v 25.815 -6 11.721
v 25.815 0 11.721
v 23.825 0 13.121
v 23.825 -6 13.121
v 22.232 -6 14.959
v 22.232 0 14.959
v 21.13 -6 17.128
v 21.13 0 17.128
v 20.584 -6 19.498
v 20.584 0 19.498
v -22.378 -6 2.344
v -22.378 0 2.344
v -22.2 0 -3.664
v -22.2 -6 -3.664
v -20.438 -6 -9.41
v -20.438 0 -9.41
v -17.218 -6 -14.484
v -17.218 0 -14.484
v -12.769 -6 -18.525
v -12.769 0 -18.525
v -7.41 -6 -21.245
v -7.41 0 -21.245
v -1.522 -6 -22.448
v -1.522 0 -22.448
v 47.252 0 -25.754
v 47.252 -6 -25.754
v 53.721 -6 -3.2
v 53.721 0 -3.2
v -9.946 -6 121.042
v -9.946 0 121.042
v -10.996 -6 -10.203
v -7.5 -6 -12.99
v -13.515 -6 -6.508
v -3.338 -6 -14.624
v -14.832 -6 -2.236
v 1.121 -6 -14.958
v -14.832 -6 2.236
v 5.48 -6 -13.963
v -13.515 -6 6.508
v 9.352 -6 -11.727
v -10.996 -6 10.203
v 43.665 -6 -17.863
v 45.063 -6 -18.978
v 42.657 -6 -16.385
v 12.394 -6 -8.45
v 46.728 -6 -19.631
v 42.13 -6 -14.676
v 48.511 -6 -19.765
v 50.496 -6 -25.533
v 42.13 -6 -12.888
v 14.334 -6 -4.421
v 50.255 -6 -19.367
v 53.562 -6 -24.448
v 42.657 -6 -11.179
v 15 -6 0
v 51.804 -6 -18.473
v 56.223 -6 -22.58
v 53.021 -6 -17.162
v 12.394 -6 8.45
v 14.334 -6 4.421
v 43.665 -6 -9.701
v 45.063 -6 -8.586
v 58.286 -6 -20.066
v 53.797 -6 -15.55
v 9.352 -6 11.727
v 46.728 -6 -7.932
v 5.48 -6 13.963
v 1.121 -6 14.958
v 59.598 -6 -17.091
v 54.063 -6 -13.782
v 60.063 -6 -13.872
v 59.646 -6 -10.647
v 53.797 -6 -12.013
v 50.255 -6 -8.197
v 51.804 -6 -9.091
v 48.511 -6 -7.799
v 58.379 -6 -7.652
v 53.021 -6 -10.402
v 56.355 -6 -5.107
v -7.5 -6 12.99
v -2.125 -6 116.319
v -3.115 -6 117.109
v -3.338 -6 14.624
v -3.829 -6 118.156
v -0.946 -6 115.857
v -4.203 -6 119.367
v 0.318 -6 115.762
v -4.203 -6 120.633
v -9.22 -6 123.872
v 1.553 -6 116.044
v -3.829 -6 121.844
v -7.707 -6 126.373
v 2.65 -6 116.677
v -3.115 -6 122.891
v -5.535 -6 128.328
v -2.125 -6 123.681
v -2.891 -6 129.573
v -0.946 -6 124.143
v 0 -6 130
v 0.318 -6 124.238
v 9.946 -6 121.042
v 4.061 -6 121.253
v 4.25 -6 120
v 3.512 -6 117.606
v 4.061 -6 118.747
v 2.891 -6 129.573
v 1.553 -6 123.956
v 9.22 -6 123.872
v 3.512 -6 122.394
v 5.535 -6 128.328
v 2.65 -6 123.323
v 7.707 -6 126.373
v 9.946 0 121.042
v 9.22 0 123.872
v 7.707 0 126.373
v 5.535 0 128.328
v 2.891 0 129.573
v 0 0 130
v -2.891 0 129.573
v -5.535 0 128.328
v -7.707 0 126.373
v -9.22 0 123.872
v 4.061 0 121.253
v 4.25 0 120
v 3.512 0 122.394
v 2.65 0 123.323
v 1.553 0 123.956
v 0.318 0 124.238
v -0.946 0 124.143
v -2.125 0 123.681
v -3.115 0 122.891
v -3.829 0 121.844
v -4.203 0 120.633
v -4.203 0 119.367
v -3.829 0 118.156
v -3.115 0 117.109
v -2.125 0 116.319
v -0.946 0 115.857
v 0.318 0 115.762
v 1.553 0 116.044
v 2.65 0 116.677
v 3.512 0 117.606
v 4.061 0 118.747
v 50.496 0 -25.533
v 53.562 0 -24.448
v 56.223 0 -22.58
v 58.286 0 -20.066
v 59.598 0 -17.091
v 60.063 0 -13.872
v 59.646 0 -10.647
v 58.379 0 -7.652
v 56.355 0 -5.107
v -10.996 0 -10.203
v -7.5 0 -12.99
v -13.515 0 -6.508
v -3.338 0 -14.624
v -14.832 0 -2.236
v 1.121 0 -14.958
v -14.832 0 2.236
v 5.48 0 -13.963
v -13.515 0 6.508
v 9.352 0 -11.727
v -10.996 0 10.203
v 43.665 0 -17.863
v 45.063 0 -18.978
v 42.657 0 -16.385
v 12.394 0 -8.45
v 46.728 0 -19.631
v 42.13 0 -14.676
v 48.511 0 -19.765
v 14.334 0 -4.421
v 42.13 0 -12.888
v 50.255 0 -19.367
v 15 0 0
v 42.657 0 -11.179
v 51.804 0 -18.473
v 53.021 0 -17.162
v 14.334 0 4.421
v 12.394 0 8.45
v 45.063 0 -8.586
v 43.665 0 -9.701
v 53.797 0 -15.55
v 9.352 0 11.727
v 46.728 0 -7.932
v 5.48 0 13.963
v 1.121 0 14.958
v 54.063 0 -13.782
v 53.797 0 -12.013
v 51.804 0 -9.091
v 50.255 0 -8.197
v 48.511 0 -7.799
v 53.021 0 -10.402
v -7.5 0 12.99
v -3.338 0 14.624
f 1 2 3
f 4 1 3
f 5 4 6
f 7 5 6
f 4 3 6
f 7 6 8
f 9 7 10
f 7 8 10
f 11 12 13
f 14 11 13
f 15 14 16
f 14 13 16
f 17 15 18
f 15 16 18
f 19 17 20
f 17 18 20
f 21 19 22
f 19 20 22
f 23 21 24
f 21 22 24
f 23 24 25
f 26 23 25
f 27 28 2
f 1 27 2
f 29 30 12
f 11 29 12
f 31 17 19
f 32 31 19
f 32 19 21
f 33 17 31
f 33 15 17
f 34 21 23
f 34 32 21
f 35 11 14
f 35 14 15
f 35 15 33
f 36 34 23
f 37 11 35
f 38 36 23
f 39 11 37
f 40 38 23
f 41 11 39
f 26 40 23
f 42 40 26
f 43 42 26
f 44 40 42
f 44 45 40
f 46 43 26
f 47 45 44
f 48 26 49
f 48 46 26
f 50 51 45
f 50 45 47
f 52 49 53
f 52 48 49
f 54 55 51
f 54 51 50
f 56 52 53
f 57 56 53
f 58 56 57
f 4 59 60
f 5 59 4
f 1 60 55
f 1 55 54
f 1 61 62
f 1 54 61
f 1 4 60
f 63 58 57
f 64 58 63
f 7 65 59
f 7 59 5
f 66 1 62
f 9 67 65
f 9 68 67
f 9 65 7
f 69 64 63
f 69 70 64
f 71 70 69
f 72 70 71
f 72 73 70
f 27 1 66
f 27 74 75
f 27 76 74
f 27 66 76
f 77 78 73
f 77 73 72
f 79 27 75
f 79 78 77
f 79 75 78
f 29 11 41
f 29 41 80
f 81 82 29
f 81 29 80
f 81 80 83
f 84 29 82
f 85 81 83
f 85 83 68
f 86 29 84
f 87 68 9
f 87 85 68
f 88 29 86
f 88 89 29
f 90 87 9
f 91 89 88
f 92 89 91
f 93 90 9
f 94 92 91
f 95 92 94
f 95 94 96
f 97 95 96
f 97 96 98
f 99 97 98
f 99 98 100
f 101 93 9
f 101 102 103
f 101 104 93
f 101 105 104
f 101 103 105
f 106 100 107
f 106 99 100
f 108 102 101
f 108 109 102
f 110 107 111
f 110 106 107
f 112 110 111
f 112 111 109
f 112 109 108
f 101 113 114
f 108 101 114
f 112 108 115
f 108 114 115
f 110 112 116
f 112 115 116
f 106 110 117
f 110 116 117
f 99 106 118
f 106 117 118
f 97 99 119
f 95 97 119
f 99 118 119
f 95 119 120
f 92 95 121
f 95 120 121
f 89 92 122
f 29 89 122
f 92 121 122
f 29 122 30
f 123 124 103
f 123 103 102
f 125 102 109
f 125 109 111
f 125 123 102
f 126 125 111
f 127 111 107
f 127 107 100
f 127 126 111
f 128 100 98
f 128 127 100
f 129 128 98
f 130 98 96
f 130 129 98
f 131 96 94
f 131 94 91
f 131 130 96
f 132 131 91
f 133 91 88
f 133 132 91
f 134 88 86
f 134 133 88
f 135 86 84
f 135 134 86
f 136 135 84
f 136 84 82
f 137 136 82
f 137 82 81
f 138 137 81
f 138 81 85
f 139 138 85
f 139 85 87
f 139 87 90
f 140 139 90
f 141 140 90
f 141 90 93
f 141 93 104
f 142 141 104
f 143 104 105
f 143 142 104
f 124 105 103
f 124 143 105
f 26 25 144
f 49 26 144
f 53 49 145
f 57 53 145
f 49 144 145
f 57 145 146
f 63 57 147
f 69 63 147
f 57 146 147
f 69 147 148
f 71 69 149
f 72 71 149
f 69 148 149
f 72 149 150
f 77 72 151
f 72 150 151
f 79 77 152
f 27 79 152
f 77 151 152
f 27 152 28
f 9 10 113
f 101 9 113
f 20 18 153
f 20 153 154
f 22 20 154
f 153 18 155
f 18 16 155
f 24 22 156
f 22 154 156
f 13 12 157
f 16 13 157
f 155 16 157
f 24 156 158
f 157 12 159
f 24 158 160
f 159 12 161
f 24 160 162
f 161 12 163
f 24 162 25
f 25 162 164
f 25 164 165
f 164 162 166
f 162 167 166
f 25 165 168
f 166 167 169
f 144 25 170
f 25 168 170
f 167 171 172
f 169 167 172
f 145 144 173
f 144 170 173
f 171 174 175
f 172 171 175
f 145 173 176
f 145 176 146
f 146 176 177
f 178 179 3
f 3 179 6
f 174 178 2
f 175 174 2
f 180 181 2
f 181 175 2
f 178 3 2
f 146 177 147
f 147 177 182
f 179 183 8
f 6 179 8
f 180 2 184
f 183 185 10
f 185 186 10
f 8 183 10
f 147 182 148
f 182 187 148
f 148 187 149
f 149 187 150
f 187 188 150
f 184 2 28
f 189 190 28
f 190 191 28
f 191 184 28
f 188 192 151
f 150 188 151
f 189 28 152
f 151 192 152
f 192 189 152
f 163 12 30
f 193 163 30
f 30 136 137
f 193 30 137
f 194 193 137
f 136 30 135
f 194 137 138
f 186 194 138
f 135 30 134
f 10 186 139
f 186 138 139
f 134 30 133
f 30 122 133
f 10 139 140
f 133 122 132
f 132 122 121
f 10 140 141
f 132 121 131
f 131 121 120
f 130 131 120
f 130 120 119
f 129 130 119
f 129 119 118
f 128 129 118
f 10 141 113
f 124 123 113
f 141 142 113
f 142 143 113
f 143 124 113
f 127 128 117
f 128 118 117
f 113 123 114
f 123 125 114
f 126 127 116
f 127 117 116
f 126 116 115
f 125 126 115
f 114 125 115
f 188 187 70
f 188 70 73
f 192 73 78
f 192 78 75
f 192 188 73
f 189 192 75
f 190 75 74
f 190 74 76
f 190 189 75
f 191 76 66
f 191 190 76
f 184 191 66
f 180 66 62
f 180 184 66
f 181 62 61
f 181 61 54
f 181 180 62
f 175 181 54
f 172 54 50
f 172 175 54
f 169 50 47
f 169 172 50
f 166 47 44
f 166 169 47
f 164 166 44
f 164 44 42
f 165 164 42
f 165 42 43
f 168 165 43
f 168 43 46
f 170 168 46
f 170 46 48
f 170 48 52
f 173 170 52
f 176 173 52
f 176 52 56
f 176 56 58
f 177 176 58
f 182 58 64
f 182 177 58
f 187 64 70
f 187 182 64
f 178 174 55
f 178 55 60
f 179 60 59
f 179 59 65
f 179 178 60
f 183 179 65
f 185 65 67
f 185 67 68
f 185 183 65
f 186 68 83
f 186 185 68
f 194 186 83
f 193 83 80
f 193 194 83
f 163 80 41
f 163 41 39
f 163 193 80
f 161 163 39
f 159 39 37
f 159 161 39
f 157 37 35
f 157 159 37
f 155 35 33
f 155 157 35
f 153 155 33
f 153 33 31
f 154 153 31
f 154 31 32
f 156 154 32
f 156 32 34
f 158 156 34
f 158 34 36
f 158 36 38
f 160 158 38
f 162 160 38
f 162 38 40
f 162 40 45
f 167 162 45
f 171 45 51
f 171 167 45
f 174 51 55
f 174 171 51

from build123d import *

# Parameters (mm, degrees)
F0_R     = 15
F0_R_2   = 6
F0_R_3   = 4.25
F1_DEPTH = 6


with BuildPart() as f1:
    # F0 (on Front) → F1 (new body)
    with BuildSketch(Plane.XZ):
        with BuildLine():
            Line((-9.945599, 121.041667), (-22.377597, 2.34375))
            ThreePointArc((-22.377597, 2.34375), (-17.217914, -14.484248), (-1.521587, -22.448492))
            Line((-1.521587, -22.448492), (47.251572, -25.754397))
            ThreePointArc((47.251572, -25.754397), (59.597932, -17.090538), (53.721232, -3.199554))
            Line((53.721232, -3.199554), (25.814877, 11.721405))
            ThreePointArc((25.814877, 11.721405), (22.232244, 14.959028), (20.584437, 19.497993))
            Line((20.584437, 19.497993), (9.945599, 121.041667))
            ThreePointArc((9.945599, 121.041667), (0, 130), (-9.945599, 121.041667))
        make_face()
        Circle(F0_R, mode=Mode.SUBTRACT)
        with Locations((48.063085, -13.781868)):
            Circle(F0_R_2, mode=Mode.SUBTRACT)
        with Locations((0, 120)):
            Circle(F0_R_3, mode=Mode.SUBTRACT)
    extrude(amount=F1_DEPTH)


solid = f1.part
